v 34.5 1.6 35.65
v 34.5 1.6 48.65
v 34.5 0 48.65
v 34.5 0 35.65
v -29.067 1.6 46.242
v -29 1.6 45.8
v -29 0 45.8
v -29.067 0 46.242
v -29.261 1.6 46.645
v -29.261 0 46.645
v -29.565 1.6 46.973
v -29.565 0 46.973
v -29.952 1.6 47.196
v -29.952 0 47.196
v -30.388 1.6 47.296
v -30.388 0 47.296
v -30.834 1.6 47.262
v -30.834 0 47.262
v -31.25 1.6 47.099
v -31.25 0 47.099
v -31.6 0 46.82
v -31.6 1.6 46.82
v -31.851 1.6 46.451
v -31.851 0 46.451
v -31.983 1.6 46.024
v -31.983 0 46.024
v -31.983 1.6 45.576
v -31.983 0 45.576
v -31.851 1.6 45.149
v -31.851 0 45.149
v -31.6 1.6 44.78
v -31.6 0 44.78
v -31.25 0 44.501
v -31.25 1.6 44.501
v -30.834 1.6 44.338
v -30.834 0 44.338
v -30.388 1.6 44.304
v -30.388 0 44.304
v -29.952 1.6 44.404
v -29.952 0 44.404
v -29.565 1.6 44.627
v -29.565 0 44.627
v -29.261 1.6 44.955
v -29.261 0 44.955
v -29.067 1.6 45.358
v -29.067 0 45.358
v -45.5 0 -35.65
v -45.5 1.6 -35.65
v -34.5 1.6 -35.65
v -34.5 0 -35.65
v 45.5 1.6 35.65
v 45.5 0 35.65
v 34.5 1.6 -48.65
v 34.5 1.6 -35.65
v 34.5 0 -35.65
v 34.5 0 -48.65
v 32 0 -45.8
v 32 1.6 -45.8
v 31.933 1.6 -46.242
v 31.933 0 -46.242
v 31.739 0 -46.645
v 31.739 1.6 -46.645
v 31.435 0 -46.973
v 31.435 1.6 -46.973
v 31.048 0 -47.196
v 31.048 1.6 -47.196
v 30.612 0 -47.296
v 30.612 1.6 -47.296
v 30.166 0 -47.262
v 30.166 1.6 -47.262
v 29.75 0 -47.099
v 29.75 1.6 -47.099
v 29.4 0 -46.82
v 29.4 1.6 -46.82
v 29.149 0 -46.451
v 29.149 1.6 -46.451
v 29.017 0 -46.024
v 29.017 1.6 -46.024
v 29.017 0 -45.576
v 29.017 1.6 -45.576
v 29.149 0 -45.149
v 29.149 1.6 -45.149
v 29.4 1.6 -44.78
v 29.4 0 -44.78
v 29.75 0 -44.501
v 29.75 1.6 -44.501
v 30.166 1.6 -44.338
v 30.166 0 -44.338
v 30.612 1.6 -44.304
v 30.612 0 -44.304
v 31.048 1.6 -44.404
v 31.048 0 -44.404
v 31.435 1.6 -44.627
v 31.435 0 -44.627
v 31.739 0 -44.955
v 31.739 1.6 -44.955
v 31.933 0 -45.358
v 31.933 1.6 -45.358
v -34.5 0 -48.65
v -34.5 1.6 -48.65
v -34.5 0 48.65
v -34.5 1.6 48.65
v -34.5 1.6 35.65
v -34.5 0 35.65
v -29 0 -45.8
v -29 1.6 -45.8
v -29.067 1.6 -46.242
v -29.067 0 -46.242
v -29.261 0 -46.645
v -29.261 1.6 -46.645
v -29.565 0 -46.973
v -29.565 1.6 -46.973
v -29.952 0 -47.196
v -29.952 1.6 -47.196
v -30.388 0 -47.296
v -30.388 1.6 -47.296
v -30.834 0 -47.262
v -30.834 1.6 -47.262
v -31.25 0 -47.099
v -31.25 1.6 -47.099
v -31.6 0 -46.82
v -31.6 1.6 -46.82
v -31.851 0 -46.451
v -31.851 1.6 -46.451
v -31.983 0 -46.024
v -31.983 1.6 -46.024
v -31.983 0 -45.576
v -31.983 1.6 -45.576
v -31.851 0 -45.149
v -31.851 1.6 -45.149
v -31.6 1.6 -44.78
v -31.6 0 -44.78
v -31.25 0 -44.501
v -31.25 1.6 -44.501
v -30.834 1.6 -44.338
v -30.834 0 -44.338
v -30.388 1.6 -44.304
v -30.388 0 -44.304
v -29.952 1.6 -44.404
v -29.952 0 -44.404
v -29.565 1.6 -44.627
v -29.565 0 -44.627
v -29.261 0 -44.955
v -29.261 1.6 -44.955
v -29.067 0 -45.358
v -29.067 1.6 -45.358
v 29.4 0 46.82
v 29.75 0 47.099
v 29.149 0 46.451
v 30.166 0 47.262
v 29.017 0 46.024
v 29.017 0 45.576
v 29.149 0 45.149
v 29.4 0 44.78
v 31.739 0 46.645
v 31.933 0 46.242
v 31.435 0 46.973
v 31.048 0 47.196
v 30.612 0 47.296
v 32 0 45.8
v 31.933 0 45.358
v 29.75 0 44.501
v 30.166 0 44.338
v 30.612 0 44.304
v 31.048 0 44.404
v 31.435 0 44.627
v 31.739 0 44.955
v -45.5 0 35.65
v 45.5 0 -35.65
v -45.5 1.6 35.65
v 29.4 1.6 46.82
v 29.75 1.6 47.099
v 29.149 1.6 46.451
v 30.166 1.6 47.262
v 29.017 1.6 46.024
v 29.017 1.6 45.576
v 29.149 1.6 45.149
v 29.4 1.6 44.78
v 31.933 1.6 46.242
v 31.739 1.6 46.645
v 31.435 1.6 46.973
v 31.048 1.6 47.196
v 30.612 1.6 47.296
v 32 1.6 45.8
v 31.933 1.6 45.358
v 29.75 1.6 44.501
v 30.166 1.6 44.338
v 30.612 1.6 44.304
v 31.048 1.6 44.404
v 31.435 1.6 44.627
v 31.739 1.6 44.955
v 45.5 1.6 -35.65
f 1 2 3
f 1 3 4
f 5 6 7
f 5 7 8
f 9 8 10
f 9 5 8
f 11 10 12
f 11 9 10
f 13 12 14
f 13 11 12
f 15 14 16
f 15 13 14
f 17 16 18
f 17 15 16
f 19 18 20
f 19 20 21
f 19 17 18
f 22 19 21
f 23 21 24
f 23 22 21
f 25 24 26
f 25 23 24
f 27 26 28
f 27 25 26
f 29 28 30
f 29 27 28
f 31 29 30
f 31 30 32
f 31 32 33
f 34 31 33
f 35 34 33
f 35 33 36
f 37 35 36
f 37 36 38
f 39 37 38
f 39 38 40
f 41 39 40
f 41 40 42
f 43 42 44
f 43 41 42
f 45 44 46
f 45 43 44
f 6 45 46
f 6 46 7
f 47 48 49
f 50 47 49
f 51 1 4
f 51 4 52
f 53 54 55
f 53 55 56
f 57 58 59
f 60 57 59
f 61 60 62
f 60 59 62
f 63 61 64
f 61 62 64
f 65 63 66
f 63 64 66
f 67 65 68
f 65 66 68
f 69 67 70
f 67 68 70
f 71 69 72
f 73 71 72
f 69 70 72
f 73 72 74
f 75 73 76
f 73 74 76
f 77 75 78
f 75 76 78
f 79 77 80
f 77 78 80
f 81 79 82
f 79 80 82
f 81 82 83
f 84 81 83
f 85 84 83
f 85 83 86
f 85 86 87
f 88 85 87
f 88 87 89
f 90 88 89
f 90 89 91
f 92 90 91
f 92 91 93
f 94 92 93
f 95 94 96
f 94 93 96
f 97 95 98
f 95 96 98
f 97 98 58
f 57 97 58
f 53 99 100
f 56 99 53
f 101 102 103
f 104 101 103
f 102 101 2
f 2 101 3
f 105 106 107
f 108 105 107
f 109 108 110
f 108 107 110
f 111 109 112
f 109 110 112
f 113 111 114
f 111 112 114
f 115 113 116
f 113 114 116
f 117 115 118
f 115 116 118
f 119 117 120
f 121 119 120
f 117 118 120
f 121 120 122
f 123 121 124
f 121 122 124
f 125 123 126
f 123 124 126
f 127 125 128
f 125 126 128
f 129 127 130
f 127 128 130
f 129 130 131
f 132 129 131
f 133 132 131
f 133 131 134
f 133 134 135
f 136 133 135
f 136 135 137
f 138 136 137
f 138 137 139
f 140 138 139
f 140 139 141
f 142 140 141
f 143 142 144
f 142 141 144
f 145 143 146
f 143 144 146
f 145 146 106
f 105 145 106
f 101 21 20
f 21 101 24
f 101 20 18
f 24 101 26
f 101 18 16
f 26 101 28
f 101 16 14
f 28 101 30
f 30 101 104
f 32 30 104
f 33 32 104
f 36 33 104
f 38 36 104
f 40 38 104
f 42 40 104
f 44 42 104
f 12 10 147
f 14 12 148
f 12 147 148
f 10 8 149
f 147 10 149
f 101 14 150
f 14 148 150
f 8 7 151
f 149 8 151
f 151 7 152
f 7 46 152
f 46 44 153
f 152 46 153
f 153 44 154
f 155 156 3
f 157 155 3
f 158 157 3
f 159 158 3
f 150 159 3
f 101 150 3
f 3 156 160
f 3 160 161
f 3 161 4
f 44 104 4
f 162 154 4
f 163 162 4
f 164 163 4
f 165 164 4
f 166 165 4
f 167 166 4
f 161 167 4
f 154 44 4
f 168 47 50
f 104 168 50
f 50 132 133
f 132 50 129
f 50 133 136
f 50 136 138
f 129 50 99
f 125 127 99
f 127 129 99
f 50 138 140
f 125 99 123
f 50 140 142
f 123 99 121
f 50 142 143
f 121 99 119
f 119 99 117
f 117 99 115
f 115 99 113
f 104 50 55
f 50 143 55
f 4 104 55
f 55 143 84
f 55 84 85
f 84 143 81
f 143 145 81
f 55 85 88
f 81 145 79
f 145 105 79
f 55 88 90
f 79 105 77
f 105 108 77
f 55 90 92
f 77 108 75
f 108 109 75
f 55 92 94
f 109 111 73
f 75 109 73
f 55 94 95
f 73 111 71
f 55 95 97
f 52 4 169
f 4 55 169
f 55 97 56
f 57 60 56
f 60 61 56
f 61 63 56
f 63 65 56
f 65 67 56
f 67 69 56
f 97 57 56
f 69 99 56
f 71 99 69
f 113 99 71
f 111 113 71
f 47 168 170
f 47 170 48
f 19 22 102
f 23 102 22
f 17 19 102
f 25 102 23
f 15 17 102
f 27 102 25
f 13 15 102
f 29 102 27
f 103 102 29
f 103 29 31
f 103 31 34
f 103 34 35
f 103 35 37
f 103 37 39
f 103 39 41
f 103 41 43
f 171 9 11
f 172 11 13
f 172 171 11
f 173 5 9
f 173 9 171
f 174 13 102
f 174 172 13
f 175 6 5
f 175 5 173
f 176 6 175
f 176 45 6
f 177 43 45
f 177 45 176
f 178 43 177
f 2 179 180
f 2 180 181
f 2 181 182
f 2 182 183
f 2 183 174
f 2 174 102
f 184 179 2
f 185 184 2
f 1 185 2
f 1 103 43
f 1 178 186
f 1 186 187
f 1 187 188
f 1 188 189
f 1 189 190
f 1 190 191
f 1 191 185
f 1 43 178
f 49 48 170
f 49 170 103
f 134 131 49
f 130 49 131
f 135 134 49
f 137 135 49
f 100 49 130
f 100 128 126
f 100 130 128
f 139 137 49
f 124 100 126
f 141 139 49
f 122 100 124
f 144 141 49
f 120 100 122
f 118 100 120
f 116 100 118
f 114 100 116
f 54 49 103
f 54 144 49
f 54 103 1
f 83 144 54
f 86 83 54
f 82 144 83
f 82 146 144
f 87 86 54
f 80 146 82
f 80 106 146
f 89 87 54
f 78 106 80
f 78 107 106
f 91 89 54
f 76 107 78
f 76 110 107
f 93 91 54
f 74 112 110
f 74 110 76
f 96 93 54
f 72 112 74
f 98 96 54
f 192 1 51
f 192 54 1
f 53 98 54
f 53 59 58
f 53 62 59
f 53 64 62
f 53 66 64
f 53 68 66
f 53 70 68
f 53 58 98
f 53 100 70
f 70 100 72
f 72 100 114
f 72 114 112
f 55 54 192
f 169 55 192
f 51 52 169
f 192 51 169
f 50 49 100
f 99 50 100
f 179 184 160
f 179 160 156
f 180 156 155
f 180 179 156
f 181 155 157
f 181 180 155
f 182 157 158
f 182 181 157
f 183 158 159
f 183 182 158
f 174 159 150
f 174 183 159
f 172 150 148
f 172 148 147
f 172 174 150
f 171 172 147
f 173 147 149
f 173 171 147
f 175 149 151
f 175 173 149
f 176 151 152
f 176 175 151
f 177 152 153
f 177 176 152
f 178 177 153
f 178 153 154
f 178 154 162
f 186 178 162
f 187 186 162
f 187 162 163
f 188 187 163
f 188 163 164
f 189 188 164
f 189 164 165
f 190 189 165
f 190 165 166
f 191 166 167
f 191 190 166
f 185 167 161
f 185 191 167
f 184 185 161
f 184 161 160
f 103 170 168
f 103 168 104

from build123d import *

# Parameters (mm, degrees)
SKETCH1_W           = 91
SKETCH1_H           = 97.3
BOSS_EXTRUDE1_DEPTH = 1.6
SKETCH2_W           = 11
SKETCH2_H           = 13
CUT_EXTRUDE1_DEPTH  = 1.6
SKETCH3_R           = 1.5
CUT_EXTRUDE2_DEPTH  = 1.6


with BuildPart() as part:
    # Sketch1 → Boss-Extrude1 (new body)
    with BuildSketch(Plane(origin=(0, 0, 0), x_dir=(1, 0, 0), z_dir=(0, 1, 0))):
        Rectangle(SKETCH1_W, SKETCH1_H)
    extrude(amount=BOSS_EXTRUDE1_DEPTH)

    # Sketch2 → Cut-Extrude1 (cut)
    with BuildSketch(Plane(origin=(0, 1.6, 0), x_dir=(1, 0, 0), z_dir=(0, 1, 0))):
        with Locations((-40, 42.15)):
            Rectangle(SKETCH2_W, SKETCH2_H)
        with Locations((40, 42.15)):
            Rectangle(SKETCH2_W, SKETCH2_H)
        with Locations((-40, -42.15)):
            Rectangle(SKETCH2_W, SKETCH2_H)
        with Locations((40, -42.15)):
            Rectangle(SKETCH2_W, SKETCH2_H)
    extrude(amount=-CUT_EXTRUDE1_DEPTH, mode=Mode.SUBTRACT)

    # Sketch3 → Cut-Extrude2 (cut)
    with BuildSketch(Plane(origin=(0, 1.6, 0), x_dir=(1, 0, 0), z_dir=(0, 1, 0))):
        with Locations((-30.5, 45.8)):
            Circle(SKETCH3_R)
        with Locations((30.5, 45.8)):
            Circle(SKETCH3_R)
    cut_extrude2 = extrude(amount=-CUT_EXTRUDE2_DEPTH, mode=Mode.SUBTRACT)

    # Mirror1: Cut-Extrude2 across plane
    add(cut_extrude2.mirror(Plane.XY), mode=Mode.SUBTRACT)


solid = part.part
